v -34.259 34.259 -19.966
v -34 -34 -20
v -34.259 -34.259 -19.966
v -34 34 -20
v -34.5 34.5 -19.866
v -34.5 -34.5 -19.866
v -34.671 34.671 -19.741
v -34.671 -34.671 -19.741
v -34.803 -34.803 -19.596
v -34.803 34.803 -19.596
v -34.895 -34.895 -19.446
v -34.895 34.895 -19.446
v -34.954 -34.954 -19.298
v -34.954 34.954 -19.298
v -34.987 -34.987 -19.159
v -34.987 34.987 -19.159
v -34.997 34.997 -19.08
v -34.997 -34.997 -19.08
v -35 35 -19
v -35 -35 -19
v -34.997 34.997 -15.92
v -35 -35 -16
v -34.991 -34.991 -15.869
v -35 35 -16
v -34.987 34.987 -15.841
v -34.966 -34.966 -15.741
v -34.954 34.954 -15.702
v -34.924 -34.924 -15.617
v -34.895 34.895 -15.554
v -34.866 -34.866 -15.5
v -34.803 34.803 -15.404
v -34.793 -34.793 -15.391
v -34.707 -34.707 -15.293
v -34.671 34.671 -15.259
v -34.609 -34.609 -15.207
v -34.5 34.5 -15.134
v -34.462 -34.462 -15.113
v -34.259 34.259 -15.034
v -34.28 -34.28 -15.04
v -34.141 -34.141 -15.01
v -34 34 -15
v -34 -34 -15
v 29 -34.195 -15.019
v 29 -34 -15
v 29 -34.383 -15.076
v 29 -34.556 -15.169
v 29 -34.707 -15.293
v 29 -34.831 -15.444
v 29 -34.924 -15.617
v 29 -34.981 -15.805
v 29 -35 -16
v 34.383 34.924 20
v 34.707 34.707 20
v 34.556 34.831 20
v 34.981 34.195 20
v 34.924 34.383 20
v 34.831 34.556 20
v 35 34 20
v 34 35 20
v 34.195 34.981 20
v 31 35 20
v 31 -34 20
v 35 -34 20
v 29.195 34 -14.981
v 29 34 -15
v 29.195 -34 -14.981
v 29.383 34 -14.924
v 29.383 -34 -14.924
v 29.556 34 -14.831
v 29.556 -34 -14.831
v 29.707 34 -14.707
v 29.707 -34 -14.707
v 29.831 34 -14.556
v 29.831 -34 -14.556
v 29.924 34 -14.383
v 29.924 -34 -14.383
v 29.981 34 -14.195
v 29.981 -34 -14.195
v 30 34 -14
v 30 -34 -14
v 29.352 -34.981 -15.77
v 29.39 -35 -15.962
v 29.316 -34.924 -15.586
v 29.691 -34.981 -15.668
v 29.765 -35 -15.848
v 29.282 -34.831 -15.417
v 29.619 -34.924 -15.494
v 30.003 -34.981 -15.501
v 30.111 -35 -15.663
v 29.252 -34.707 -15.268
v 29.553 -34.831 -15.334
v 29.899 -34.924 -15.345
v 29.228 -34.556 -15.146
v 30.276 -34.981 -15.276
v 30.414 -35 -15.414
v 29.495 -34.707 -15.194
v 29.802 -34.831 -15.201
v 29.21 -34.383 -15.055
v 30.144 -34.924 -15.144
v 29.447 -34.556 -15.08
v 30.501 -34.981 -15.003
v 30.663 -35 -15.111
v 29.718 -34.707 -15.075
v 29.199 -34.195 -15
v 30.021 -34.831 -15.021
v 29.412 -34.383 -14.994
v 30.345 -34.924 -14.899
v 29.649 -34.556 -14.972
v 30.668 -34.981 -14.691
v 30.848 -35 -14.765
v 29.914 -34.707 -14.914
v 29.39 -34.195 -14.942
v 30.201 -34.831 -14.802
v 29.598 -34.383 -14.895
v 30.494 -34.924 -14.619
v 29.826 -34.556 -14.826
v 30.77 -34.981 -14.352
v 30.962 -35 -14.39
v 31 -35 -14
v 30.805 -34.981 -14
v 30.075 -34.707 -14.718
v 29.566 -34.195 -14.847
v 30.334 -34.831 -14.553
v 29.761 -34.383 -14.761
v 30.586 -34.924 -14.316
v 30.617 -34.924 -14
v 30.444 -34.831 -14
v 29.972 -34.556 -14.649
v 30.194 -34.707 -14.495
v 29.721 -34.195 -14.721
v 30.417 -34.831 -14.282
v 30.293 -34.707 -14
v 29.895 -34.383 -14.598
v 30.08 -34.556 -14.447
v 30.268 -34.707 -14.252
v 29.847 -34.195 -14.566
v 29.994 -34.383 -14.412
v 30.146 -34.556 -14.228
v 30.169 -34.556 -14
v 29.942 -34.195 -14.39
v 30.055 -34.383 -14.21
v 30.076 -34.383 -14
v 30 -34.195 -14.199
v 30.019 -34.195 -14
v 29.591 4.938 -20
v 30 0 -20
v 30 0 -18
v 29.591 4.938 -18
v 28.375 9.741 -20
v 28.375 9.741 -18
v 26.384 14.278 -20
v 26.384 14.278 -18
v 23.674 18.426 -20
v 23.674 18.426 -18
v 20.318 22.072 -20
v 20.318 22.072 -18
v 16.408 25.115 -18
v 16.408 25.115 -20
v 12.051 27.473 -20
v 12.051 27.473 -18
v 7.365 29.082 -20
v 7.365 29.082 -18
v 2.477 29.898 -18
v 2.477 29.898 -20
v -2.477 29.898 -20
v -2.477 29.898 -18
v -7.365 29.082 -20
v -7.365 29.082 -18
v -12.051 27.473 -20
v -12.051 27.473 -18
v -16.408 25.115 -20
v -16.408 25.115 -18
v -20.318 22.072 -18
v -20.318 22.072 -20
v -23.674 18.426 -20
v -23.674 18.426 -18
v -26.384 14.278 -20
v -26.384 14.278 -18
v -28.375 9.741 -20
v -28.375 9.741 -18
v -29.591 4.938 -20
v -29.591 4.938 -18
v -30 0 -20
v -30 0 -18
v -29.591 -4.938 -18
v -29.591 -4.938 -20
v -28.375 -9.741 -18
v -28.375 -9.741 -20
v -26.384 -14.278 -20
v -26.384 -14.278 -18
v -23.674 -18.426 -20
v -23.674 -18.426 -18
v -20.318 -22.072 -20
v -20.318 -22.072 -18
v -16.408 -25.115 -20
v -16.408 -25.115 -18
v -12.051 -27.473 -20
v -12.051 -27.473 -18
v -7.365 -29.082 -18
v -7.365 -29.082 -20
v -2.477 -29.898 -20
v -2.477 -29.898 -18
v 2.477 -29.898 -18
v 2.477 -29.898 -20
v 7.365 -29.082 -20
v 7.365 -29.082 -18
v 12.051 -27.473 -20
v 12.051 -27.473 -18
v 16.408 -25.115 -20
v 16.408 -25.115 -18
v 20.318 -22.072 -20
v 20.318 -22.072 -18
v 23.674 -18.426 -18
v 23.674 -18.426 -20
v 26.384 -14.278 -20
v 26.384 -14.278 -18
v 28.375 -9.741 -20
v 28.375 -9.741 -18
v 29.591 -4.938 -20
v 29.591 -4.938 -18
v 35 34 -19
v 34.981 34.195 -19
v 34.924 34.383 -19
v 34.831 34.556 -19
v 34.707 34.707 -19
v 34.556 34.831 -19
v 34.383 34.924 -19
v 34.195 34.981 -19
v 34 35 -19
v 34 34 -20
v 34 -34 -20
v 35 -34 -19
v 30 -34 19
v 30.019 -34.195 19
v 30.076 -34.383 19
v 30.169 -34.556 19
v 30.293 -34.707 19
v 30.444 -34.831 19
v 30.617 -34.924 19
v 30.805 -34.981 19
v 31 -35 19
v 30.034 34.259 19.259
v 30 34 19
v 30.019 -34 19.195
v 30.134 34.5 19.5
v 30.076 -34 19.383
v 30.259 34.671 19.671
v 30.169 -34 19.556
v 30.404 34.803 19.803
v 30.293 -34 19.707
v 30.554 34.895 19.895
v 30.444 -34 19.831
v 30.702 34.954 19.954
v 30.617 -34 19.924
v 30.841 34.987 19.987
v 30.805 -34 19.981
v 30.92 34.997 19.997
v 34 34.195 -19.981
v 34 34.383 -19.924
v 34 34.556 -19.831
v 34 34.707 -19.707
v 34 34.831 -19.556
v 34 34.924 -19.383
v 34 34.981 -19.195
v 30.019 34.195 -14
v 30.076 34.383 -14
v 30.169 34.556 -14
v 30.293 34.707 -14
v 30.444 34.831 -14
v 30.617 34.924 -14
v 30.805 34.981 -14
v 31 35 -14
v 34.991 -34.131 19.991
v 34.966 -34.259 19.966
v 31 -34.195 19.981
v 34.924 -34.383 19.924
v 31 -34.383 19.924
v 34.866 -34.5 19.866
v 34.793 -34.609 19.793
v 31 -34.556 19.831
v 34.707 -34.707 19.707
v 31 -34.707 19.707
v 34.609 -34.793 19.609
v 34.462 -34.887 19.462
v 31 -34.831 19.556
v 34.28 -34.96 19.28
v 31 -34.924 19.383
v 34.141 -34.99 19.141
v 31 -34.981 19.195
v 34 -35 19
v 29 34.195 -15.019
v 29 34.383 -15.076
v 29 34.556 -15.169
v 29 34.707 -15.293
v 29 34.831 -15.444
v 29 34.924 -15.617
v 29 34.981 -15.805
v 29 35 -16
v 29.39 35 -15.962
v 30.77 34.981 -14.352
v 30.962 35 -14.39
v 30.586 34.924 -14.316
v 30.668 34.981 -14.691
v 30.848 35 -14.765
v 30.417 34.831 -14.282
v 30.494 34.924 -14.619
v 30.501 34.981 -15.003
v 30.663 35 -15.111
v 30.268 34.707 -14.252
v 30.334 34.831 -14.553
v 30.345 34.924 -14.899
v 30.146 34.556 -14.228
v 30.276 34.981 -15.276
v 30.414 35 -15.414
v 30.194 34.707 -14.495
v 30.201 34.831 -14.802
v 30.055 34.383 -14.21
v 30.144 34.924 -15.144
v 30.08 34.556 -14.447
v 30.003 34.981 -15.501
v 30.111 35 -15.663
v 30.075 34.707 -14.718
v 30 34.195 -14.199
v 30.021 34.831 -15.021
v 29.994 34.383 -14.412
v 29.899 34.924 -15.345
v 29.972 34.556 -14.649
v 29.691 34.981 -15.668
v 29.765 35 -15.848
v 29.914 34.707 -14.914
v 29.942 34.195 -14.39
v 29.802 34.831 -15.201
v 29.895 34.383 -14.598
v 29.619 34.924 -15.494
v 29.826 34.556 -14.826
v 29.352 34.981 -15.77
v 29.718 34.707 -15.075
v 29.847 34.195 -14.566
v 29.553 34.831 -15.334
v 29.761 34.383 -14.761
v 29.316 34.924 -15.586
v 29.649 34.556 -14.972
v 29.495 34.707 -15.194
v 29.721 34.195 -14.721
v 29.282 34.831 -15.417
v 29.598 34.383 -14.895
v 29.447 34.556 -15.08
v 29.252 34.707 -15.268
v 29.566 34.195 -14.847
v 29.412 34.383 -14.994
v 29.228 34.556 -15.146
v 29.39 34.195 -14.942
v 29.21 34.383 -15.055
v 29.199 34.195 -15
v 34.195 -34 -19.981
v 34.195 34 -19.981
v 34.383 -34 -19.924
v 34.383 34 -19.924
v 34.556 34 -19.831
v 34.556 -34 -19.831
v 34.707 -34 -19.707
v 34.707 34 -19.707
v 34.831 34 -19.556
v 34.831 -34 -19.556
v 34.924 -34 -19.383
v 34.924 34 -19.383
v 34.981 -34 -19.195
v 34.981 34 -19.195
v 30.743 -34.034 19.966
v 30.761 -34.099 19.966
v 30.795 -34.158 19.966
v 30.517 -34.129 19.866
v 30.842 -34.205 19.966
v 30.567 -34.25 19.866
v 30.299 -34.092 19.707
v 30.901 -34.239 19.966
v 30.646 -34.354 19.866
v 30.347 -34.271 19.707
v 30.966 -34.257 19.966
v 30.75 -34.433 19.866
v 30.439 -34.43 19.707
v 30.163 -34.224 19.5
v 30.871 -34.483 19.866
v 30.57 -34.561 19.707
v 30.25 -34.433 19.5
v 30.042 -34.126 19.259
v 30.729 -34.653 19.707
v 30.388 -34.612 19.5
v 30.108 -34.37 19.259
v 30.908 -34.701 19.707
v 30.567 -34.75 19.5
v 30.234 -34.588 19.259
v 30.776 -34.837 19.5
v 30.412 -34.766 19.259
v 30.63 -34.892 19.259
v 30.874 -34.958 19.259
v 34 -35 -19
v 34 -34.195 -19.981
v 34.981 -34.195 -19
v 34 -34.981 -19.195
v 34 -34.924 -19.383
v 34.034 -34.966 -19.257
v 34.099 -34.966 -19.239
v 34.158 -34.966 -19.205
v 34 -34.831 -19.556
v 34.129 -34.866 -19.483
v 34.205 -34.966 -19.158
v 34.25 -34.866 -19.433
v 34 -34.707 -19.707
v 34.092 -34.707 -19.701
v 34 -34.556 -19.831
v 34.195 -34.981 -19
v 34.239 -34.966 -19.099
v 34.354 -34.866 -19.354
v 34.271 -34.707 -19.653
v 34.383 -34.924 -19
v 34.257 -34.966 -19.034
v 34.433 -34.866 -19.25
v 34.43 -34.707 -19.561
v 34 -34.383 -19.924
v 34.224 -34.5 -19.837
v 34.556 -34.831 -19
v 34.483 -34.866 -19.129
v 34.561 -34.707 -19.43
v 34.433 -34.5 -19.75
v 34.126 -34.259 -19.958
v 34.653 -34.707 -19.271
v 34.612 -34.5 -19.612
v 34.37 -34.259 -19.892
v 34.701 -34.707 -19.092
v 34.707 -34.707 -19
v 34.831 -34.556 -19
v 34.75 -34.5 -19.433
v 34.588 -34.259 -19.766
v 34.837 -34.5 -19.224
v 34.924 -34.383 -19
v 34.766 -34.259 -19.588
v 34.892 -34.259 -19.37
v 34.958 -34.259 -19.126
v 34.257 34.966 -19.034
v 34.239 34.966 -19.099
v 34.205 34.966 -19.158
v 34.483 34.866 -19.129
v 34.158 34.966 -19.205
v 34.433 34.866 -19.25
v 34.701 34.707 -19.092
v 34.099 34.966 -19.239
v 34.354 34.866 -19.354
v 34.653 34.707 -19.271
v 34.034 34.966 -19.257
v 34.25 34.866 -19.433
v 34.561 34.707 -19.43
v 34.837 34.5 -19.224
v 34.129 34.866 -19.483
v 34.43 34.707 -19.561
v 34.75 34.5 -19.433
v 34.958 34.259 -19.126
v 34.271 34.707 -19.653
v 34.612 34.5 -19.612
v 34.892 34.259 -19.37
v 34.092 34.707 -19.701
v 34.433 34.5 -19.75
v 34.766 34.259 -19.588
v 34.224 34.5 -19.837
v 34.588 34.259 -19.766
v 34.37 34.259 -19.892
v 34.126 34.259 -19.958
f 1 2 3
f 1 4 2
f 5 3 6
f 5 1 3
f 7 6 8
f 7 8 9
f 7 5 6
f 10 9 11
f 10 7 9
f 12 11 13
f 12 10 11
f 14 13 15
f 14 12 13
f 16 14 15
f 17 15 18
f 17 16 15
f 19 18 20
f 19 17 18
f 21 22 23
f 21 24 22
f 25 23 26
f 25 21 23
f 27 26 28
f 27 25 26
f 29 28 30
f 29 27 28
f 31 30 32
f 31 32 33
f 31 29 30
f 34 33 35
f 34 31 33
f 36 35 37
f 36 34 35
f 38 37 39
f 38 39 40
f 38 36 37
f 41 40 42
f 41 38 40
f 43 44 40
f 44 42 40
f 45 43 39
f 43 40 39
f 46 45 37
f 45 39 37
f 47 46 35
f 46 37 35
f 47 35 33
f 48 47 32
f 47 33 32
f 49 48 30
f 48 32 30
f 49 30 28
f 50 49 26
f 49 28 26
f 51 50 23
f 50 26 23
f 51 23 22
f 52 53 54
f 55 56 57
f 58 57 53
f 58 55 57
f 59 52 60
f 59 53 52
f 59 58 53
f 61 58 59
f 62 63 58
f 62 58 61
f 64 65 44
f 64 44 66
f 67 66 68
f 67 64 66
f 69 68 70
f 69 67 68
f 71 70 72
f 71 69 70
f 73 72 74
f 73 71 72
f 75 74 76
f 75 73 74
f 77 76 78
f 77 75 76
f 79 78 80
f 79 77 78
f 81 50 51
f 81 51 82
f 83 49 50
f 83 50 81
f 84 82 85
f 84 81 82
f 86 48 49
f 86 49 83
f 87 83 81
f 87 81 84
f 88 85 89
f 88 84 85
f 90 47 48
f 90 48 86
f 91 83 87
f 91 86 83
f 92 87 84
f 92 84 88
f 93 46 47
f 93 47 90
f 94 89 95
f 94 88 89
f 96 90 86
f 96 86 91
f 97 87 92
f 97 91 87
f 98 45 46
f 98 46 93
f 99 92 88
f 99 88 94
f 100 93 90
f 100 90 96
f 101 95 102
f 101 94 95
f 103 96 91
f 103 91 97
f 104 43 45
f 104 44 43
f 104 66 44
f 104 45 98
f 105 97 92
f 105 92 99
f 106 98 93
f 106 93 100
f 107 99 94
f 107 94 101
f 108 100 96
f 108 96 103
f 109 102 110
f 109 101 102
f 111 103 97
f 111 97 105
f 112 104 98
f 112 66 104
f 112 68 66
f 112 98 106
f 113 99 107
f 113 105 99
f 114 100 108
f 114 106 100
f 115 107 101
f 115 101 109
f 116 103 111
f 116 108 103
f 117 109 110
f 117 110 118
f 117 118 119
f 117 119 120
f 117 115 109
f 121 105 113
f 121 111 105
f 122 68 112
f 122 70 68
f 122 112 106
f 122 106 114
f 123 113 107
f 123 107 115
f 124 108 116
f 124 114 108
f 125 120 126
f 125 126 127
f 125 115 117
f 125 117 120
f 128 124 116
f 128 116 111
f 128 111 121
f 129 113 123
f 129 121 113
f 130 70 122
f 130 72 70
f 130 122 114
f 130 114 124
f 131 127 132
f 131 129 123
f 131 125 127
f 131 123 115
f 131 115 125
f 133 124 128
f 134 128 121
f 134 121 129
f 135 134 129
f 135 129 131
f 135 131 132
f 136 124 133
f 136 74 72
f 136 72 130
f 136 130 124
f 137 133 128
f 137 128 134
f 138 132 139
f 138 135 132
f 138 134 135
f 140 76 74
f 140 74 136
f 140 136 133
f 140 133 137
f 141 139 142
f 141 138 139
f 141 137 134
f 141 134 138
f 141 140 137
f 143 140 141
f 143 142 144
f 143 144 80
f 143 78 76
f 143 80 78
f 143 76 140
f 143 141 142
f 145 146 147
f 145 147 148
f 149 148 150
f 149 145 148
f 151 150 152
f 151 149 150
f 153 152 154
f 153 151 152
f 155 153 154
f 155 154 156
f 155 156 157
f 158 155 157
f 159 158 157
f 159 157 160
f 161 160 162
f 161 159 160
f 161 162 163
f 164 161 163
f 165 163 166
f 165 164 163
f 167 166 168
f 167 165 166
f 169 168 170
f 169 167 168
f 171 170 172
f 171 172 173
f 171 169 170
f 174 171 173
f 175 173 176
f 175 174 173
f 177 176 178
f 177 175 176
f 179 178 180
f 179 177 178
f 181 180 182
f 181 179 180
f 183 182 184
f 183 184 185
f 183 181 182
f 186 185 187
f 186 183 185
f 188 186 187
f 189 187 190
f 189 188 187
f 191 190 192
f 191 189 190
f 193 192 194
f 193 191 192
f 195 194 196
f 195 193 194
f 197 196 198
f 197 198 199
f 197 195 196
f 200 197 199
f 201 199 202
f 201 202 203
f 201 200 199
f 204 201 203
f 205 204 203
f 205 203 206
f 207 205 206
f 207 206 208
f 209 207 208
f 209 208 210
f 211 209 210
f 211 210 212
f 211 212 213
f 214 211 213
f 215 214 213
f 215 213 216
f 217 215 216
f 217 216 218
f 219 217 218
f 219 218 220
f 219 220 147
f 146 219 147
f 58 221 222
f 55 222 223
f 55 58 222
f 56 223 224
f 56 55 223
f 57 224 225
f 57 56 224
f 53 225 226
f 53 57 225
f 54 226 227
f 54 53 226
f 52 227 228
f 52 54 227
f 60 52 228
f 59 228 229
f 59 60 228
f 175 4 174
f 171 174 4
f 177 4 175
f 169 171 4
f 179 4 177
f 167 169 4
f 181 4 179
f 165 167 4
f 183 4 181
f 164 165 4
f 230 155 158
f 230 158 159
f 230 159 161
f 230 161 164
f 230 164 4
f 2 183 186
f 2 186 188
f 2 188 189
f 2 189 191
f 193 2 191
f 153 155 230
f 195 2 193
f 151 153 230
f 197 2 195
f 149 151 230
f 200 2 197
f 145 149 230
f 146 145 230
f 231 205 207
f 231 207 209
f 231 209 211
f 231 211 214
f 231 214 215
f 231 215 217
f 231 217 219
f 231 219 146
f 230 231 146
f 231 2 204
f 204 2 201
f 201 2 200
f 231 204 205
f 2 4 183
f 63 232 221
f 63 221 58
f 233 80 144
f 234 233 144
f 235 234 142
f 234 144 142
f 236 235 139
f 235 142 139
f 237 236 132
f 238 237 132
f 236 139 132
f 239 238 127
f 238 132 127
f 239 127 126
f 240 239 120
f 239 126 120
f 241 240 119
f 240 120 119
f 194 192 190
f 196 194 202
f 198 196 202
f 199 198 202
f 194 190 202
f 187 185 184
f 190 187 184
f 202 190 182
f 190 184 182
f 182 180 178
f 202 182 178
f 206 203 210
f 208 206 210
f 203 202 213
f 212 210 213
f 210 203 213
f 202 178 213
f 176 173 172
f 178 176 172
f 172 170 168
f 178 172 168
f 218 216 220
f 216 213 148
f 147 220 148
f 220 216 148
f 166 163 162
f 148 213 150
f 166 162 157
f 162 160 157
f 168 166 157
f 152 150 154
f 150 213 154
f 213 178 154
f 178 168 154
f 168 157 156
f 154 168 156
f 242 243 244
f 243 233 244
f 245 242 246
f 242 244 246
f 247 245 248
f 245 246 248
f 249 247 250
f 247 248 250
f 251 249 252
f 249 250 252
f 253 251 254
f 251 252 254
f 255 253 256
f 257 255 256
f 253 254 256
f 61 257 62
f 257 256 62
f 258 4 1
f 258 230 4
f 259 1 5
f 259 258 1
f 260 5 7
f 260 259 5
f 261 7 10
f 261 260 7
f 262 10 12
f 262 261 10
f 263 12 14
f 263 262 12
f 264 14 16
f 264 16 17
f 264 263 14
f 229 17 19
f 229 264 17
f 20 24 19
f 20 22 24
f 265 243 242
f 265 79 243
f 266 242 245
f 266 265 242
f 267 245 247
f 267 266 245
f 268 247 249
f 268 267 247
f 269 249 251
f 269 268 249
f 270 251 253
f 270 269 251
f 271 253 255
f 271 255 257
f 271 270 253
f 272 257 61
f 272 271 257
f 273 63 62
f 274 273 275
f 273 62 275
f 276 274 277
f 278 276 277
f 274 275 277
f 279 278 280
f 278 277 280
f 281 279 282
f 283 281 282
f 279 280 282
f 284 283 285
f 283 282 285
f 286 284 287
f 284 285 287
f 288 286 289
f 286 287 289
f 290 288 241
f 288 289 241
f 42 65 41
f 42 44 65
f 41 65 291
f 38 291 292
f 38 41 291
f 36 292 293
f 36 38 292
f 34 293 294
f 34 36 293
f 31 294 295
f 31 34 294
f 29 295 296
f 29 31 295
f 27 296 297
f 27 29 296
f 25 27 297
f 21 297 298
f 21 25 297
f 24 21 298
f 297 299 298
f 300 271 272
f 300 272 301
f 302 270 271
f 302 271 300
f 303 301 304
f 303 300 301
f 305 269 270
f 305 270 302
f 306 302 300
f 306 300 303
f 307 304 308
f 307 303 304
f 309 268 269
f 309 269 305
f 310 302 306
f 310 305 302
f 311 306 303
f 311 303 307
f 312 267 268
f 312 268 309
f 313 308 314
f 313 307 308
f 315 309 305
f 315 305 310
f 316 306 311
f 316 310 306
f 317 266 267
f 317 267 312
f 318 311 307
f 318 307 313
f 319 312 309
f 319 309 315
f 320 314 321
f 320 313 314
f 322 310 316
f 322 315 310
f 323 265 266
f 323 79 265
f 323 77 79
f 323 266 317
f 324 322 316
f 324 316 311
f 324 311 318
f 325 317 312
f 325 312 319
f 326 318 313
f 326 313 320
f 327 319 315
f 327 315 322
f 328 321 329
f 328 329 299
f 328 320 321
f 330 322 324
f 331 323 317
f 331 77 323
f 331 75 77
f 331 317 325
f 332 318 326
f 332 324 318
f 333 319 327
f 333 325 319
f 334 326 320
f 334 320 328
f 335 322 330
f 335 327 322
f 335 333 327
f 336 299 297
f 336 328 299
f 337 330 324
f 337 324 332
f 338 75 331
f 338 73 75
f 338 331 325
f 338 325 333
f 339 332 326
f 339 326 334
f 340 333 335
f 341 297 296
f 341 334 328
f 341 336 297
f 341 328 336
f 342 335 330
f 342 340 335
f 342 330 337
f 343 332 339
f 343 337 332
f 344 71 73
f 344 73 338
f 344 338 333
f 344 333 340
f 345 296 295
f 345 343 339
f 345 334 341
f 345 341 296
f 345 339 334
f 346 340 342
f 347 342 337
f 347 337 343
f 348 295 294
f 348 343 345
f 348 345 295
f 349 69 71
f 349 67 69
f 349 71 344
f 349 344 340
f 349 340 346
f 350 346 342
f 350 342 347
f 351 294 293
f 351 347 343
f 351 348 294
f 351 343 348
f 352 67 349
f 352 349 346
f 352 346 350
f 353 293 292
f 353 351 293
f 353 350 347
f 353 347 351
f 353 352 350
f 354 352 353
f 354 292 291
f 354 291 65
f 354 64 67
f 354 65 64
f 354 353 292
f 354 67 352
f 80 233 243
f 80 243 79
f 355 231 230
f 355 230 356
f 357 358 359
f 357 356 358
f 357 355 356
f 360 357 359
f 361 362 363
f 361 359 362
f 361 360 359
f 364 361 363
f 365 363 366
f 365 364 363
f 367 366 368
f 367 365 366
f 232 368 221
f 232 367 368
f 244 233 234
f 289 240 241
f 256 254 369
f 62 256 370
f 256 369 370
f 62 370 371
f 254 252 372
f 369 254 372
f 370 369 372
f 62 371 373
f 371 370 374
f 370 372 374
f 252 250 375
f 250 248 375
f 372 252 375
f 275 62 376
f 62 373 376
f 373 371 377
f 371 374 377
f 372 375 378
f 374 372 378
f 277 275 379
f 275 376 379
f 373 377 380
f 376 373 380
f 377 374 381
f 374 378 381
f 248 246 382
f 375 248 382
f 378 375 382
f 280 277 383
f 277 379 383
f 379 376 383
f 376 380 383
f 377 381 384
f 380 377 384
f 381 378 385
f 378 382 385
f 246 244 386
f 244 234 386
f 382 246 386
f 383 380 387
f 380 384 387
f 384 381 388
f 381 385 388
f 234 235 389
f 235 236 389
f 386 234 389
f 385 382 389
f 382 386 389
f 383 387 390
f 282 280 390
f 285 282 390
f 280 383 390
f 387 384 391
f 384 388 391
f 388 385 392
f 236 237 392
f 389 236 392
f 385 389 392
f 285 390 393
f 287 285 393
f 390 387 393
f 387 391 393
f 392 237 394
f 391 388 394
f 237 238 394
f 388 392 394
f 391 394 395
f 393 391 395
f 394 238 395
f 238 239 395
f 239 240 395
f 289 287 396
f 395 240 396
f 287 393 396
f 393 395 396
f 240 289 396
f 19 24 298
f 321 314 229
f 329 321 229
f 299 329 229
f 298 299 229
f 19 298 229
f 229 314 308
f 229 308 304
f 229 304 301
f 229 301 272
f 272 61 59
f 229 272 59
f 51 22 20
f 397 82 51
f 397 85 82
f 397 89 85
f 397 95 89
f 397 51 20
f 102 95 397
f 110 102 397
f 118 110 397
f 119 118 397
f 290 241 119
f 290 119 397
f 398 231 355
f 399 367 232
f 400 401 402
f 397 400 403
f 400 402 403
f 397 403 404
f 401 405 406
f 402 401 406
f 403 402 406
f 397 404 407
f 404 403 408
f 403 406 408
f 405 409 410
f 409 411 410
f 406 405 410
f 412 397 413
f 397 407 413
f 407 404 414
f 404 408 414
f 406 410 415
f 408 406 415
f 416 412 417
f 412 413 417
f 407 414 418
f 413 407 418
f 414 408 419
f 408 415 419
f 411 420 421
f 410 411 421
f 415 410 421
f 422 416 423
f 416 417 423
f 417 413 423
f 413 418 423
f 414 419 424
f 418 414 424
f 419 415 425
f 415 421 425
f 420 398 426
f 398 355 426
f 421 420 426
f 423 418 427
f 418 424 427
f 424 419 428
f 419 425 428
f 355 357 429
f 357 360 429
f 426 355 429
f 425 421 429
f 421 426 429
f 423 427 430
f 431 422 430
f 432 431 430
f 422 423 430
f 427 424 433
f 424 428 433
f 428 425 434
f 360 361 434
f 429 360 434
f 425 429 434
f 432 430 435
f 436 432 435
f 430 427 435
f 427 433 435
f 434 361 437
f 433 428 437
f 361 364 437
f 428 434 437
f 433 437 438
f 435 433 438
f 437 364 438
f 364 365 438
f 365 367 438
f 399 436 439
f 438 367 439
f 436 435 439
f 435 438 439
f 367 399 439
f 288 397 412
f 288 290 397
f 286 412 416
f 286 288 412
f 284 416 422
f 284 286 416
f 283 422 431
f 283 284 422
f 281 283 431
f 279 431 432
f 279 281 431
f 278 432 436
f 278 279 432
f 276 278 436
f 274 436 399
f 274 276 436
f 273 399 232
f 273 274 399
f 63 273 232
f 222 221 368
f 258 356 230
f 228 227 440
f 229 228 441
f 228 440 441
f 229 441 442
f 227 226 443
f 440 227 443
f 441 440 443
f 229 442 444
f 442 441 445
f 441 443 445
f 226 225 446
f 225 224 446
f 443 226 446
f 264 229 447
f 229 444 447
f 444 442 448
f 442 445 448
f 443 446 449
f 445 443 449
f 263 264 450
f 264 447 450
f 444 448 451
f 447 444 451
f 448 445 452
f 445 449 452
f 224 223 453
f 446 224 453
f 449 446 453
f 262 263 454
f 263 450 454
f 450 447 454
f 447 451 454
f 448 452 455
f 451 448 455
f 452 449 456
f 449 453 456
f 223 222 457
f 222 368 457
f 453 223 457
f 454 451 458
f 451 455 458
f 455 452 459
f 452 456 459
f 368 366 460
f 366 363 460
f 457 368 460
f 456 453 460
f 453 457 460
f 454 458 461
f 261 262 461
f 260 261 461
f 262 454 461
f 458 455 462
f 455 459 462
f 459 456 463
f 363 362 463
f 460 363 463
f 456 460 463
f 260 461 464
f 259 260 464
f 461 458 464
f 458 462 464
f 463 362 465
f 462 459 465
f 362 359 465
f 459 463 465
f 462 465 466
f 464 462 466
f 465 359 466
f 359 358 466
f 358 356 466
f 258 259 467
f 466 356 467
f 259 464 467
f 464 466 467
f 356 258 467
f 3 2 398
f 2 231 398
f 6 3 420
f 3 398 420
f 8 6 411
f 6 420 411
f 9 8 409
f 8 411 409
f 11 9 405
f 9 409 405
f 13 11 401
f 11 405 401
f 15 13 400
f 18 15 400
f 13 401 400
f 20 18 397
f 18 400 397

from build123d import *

# Parameters (mm, degrees)
PAD_DEPTH      = 35
PAD_DEPTH_BACK = 35
FILLET_R       = 1
SKETCH001_R    = 30
POCKET_DEPTH   = 2


with BuildPart() as part:
    # Sketch → Pad (new body, two sides)
    with BuildSketch(Plane.XZ) as pad_sk:
        Polygon((-35, -20), (35, -20), (35, 20), (30, 20), (30, -15), (-35, -15), align=None)
    extrude(amount=PAD_DEPTH)
    extrude(pad_sk.sketch, amount=-PAD_DEPTH_BACK)

    # Fillet
    fillet_edges = [part.edges().sort_by_distance(p)[0] for p in [
        (35, 0, -20),
        (-2.5, 35, -15),
        (35, 35, 0),
        (0, 35, -20),
        (-35, 0, -20),
        (-35, 0, -15),
        (-2.5, -35, -15),
        (0, -35, -20),
        (30, -35, 2.5),
        (30, 0, -15),
        (30, 35, 2.5),
        (30, 0, 20),
        (32.5, -35, 20),
        (35, -35, 0),
    ]]
    fillet(fillet_edges, radius=FILLET_R)

    # Sketch001 → Pocket (cut)
    with BuildSketch(Plane.XY.offset(-20)):
        Circle(SKETCH001_R)
    extrude(amount=POCKET_DEPTH, mode=Mode.SUBTRACT)


solid = part.part
